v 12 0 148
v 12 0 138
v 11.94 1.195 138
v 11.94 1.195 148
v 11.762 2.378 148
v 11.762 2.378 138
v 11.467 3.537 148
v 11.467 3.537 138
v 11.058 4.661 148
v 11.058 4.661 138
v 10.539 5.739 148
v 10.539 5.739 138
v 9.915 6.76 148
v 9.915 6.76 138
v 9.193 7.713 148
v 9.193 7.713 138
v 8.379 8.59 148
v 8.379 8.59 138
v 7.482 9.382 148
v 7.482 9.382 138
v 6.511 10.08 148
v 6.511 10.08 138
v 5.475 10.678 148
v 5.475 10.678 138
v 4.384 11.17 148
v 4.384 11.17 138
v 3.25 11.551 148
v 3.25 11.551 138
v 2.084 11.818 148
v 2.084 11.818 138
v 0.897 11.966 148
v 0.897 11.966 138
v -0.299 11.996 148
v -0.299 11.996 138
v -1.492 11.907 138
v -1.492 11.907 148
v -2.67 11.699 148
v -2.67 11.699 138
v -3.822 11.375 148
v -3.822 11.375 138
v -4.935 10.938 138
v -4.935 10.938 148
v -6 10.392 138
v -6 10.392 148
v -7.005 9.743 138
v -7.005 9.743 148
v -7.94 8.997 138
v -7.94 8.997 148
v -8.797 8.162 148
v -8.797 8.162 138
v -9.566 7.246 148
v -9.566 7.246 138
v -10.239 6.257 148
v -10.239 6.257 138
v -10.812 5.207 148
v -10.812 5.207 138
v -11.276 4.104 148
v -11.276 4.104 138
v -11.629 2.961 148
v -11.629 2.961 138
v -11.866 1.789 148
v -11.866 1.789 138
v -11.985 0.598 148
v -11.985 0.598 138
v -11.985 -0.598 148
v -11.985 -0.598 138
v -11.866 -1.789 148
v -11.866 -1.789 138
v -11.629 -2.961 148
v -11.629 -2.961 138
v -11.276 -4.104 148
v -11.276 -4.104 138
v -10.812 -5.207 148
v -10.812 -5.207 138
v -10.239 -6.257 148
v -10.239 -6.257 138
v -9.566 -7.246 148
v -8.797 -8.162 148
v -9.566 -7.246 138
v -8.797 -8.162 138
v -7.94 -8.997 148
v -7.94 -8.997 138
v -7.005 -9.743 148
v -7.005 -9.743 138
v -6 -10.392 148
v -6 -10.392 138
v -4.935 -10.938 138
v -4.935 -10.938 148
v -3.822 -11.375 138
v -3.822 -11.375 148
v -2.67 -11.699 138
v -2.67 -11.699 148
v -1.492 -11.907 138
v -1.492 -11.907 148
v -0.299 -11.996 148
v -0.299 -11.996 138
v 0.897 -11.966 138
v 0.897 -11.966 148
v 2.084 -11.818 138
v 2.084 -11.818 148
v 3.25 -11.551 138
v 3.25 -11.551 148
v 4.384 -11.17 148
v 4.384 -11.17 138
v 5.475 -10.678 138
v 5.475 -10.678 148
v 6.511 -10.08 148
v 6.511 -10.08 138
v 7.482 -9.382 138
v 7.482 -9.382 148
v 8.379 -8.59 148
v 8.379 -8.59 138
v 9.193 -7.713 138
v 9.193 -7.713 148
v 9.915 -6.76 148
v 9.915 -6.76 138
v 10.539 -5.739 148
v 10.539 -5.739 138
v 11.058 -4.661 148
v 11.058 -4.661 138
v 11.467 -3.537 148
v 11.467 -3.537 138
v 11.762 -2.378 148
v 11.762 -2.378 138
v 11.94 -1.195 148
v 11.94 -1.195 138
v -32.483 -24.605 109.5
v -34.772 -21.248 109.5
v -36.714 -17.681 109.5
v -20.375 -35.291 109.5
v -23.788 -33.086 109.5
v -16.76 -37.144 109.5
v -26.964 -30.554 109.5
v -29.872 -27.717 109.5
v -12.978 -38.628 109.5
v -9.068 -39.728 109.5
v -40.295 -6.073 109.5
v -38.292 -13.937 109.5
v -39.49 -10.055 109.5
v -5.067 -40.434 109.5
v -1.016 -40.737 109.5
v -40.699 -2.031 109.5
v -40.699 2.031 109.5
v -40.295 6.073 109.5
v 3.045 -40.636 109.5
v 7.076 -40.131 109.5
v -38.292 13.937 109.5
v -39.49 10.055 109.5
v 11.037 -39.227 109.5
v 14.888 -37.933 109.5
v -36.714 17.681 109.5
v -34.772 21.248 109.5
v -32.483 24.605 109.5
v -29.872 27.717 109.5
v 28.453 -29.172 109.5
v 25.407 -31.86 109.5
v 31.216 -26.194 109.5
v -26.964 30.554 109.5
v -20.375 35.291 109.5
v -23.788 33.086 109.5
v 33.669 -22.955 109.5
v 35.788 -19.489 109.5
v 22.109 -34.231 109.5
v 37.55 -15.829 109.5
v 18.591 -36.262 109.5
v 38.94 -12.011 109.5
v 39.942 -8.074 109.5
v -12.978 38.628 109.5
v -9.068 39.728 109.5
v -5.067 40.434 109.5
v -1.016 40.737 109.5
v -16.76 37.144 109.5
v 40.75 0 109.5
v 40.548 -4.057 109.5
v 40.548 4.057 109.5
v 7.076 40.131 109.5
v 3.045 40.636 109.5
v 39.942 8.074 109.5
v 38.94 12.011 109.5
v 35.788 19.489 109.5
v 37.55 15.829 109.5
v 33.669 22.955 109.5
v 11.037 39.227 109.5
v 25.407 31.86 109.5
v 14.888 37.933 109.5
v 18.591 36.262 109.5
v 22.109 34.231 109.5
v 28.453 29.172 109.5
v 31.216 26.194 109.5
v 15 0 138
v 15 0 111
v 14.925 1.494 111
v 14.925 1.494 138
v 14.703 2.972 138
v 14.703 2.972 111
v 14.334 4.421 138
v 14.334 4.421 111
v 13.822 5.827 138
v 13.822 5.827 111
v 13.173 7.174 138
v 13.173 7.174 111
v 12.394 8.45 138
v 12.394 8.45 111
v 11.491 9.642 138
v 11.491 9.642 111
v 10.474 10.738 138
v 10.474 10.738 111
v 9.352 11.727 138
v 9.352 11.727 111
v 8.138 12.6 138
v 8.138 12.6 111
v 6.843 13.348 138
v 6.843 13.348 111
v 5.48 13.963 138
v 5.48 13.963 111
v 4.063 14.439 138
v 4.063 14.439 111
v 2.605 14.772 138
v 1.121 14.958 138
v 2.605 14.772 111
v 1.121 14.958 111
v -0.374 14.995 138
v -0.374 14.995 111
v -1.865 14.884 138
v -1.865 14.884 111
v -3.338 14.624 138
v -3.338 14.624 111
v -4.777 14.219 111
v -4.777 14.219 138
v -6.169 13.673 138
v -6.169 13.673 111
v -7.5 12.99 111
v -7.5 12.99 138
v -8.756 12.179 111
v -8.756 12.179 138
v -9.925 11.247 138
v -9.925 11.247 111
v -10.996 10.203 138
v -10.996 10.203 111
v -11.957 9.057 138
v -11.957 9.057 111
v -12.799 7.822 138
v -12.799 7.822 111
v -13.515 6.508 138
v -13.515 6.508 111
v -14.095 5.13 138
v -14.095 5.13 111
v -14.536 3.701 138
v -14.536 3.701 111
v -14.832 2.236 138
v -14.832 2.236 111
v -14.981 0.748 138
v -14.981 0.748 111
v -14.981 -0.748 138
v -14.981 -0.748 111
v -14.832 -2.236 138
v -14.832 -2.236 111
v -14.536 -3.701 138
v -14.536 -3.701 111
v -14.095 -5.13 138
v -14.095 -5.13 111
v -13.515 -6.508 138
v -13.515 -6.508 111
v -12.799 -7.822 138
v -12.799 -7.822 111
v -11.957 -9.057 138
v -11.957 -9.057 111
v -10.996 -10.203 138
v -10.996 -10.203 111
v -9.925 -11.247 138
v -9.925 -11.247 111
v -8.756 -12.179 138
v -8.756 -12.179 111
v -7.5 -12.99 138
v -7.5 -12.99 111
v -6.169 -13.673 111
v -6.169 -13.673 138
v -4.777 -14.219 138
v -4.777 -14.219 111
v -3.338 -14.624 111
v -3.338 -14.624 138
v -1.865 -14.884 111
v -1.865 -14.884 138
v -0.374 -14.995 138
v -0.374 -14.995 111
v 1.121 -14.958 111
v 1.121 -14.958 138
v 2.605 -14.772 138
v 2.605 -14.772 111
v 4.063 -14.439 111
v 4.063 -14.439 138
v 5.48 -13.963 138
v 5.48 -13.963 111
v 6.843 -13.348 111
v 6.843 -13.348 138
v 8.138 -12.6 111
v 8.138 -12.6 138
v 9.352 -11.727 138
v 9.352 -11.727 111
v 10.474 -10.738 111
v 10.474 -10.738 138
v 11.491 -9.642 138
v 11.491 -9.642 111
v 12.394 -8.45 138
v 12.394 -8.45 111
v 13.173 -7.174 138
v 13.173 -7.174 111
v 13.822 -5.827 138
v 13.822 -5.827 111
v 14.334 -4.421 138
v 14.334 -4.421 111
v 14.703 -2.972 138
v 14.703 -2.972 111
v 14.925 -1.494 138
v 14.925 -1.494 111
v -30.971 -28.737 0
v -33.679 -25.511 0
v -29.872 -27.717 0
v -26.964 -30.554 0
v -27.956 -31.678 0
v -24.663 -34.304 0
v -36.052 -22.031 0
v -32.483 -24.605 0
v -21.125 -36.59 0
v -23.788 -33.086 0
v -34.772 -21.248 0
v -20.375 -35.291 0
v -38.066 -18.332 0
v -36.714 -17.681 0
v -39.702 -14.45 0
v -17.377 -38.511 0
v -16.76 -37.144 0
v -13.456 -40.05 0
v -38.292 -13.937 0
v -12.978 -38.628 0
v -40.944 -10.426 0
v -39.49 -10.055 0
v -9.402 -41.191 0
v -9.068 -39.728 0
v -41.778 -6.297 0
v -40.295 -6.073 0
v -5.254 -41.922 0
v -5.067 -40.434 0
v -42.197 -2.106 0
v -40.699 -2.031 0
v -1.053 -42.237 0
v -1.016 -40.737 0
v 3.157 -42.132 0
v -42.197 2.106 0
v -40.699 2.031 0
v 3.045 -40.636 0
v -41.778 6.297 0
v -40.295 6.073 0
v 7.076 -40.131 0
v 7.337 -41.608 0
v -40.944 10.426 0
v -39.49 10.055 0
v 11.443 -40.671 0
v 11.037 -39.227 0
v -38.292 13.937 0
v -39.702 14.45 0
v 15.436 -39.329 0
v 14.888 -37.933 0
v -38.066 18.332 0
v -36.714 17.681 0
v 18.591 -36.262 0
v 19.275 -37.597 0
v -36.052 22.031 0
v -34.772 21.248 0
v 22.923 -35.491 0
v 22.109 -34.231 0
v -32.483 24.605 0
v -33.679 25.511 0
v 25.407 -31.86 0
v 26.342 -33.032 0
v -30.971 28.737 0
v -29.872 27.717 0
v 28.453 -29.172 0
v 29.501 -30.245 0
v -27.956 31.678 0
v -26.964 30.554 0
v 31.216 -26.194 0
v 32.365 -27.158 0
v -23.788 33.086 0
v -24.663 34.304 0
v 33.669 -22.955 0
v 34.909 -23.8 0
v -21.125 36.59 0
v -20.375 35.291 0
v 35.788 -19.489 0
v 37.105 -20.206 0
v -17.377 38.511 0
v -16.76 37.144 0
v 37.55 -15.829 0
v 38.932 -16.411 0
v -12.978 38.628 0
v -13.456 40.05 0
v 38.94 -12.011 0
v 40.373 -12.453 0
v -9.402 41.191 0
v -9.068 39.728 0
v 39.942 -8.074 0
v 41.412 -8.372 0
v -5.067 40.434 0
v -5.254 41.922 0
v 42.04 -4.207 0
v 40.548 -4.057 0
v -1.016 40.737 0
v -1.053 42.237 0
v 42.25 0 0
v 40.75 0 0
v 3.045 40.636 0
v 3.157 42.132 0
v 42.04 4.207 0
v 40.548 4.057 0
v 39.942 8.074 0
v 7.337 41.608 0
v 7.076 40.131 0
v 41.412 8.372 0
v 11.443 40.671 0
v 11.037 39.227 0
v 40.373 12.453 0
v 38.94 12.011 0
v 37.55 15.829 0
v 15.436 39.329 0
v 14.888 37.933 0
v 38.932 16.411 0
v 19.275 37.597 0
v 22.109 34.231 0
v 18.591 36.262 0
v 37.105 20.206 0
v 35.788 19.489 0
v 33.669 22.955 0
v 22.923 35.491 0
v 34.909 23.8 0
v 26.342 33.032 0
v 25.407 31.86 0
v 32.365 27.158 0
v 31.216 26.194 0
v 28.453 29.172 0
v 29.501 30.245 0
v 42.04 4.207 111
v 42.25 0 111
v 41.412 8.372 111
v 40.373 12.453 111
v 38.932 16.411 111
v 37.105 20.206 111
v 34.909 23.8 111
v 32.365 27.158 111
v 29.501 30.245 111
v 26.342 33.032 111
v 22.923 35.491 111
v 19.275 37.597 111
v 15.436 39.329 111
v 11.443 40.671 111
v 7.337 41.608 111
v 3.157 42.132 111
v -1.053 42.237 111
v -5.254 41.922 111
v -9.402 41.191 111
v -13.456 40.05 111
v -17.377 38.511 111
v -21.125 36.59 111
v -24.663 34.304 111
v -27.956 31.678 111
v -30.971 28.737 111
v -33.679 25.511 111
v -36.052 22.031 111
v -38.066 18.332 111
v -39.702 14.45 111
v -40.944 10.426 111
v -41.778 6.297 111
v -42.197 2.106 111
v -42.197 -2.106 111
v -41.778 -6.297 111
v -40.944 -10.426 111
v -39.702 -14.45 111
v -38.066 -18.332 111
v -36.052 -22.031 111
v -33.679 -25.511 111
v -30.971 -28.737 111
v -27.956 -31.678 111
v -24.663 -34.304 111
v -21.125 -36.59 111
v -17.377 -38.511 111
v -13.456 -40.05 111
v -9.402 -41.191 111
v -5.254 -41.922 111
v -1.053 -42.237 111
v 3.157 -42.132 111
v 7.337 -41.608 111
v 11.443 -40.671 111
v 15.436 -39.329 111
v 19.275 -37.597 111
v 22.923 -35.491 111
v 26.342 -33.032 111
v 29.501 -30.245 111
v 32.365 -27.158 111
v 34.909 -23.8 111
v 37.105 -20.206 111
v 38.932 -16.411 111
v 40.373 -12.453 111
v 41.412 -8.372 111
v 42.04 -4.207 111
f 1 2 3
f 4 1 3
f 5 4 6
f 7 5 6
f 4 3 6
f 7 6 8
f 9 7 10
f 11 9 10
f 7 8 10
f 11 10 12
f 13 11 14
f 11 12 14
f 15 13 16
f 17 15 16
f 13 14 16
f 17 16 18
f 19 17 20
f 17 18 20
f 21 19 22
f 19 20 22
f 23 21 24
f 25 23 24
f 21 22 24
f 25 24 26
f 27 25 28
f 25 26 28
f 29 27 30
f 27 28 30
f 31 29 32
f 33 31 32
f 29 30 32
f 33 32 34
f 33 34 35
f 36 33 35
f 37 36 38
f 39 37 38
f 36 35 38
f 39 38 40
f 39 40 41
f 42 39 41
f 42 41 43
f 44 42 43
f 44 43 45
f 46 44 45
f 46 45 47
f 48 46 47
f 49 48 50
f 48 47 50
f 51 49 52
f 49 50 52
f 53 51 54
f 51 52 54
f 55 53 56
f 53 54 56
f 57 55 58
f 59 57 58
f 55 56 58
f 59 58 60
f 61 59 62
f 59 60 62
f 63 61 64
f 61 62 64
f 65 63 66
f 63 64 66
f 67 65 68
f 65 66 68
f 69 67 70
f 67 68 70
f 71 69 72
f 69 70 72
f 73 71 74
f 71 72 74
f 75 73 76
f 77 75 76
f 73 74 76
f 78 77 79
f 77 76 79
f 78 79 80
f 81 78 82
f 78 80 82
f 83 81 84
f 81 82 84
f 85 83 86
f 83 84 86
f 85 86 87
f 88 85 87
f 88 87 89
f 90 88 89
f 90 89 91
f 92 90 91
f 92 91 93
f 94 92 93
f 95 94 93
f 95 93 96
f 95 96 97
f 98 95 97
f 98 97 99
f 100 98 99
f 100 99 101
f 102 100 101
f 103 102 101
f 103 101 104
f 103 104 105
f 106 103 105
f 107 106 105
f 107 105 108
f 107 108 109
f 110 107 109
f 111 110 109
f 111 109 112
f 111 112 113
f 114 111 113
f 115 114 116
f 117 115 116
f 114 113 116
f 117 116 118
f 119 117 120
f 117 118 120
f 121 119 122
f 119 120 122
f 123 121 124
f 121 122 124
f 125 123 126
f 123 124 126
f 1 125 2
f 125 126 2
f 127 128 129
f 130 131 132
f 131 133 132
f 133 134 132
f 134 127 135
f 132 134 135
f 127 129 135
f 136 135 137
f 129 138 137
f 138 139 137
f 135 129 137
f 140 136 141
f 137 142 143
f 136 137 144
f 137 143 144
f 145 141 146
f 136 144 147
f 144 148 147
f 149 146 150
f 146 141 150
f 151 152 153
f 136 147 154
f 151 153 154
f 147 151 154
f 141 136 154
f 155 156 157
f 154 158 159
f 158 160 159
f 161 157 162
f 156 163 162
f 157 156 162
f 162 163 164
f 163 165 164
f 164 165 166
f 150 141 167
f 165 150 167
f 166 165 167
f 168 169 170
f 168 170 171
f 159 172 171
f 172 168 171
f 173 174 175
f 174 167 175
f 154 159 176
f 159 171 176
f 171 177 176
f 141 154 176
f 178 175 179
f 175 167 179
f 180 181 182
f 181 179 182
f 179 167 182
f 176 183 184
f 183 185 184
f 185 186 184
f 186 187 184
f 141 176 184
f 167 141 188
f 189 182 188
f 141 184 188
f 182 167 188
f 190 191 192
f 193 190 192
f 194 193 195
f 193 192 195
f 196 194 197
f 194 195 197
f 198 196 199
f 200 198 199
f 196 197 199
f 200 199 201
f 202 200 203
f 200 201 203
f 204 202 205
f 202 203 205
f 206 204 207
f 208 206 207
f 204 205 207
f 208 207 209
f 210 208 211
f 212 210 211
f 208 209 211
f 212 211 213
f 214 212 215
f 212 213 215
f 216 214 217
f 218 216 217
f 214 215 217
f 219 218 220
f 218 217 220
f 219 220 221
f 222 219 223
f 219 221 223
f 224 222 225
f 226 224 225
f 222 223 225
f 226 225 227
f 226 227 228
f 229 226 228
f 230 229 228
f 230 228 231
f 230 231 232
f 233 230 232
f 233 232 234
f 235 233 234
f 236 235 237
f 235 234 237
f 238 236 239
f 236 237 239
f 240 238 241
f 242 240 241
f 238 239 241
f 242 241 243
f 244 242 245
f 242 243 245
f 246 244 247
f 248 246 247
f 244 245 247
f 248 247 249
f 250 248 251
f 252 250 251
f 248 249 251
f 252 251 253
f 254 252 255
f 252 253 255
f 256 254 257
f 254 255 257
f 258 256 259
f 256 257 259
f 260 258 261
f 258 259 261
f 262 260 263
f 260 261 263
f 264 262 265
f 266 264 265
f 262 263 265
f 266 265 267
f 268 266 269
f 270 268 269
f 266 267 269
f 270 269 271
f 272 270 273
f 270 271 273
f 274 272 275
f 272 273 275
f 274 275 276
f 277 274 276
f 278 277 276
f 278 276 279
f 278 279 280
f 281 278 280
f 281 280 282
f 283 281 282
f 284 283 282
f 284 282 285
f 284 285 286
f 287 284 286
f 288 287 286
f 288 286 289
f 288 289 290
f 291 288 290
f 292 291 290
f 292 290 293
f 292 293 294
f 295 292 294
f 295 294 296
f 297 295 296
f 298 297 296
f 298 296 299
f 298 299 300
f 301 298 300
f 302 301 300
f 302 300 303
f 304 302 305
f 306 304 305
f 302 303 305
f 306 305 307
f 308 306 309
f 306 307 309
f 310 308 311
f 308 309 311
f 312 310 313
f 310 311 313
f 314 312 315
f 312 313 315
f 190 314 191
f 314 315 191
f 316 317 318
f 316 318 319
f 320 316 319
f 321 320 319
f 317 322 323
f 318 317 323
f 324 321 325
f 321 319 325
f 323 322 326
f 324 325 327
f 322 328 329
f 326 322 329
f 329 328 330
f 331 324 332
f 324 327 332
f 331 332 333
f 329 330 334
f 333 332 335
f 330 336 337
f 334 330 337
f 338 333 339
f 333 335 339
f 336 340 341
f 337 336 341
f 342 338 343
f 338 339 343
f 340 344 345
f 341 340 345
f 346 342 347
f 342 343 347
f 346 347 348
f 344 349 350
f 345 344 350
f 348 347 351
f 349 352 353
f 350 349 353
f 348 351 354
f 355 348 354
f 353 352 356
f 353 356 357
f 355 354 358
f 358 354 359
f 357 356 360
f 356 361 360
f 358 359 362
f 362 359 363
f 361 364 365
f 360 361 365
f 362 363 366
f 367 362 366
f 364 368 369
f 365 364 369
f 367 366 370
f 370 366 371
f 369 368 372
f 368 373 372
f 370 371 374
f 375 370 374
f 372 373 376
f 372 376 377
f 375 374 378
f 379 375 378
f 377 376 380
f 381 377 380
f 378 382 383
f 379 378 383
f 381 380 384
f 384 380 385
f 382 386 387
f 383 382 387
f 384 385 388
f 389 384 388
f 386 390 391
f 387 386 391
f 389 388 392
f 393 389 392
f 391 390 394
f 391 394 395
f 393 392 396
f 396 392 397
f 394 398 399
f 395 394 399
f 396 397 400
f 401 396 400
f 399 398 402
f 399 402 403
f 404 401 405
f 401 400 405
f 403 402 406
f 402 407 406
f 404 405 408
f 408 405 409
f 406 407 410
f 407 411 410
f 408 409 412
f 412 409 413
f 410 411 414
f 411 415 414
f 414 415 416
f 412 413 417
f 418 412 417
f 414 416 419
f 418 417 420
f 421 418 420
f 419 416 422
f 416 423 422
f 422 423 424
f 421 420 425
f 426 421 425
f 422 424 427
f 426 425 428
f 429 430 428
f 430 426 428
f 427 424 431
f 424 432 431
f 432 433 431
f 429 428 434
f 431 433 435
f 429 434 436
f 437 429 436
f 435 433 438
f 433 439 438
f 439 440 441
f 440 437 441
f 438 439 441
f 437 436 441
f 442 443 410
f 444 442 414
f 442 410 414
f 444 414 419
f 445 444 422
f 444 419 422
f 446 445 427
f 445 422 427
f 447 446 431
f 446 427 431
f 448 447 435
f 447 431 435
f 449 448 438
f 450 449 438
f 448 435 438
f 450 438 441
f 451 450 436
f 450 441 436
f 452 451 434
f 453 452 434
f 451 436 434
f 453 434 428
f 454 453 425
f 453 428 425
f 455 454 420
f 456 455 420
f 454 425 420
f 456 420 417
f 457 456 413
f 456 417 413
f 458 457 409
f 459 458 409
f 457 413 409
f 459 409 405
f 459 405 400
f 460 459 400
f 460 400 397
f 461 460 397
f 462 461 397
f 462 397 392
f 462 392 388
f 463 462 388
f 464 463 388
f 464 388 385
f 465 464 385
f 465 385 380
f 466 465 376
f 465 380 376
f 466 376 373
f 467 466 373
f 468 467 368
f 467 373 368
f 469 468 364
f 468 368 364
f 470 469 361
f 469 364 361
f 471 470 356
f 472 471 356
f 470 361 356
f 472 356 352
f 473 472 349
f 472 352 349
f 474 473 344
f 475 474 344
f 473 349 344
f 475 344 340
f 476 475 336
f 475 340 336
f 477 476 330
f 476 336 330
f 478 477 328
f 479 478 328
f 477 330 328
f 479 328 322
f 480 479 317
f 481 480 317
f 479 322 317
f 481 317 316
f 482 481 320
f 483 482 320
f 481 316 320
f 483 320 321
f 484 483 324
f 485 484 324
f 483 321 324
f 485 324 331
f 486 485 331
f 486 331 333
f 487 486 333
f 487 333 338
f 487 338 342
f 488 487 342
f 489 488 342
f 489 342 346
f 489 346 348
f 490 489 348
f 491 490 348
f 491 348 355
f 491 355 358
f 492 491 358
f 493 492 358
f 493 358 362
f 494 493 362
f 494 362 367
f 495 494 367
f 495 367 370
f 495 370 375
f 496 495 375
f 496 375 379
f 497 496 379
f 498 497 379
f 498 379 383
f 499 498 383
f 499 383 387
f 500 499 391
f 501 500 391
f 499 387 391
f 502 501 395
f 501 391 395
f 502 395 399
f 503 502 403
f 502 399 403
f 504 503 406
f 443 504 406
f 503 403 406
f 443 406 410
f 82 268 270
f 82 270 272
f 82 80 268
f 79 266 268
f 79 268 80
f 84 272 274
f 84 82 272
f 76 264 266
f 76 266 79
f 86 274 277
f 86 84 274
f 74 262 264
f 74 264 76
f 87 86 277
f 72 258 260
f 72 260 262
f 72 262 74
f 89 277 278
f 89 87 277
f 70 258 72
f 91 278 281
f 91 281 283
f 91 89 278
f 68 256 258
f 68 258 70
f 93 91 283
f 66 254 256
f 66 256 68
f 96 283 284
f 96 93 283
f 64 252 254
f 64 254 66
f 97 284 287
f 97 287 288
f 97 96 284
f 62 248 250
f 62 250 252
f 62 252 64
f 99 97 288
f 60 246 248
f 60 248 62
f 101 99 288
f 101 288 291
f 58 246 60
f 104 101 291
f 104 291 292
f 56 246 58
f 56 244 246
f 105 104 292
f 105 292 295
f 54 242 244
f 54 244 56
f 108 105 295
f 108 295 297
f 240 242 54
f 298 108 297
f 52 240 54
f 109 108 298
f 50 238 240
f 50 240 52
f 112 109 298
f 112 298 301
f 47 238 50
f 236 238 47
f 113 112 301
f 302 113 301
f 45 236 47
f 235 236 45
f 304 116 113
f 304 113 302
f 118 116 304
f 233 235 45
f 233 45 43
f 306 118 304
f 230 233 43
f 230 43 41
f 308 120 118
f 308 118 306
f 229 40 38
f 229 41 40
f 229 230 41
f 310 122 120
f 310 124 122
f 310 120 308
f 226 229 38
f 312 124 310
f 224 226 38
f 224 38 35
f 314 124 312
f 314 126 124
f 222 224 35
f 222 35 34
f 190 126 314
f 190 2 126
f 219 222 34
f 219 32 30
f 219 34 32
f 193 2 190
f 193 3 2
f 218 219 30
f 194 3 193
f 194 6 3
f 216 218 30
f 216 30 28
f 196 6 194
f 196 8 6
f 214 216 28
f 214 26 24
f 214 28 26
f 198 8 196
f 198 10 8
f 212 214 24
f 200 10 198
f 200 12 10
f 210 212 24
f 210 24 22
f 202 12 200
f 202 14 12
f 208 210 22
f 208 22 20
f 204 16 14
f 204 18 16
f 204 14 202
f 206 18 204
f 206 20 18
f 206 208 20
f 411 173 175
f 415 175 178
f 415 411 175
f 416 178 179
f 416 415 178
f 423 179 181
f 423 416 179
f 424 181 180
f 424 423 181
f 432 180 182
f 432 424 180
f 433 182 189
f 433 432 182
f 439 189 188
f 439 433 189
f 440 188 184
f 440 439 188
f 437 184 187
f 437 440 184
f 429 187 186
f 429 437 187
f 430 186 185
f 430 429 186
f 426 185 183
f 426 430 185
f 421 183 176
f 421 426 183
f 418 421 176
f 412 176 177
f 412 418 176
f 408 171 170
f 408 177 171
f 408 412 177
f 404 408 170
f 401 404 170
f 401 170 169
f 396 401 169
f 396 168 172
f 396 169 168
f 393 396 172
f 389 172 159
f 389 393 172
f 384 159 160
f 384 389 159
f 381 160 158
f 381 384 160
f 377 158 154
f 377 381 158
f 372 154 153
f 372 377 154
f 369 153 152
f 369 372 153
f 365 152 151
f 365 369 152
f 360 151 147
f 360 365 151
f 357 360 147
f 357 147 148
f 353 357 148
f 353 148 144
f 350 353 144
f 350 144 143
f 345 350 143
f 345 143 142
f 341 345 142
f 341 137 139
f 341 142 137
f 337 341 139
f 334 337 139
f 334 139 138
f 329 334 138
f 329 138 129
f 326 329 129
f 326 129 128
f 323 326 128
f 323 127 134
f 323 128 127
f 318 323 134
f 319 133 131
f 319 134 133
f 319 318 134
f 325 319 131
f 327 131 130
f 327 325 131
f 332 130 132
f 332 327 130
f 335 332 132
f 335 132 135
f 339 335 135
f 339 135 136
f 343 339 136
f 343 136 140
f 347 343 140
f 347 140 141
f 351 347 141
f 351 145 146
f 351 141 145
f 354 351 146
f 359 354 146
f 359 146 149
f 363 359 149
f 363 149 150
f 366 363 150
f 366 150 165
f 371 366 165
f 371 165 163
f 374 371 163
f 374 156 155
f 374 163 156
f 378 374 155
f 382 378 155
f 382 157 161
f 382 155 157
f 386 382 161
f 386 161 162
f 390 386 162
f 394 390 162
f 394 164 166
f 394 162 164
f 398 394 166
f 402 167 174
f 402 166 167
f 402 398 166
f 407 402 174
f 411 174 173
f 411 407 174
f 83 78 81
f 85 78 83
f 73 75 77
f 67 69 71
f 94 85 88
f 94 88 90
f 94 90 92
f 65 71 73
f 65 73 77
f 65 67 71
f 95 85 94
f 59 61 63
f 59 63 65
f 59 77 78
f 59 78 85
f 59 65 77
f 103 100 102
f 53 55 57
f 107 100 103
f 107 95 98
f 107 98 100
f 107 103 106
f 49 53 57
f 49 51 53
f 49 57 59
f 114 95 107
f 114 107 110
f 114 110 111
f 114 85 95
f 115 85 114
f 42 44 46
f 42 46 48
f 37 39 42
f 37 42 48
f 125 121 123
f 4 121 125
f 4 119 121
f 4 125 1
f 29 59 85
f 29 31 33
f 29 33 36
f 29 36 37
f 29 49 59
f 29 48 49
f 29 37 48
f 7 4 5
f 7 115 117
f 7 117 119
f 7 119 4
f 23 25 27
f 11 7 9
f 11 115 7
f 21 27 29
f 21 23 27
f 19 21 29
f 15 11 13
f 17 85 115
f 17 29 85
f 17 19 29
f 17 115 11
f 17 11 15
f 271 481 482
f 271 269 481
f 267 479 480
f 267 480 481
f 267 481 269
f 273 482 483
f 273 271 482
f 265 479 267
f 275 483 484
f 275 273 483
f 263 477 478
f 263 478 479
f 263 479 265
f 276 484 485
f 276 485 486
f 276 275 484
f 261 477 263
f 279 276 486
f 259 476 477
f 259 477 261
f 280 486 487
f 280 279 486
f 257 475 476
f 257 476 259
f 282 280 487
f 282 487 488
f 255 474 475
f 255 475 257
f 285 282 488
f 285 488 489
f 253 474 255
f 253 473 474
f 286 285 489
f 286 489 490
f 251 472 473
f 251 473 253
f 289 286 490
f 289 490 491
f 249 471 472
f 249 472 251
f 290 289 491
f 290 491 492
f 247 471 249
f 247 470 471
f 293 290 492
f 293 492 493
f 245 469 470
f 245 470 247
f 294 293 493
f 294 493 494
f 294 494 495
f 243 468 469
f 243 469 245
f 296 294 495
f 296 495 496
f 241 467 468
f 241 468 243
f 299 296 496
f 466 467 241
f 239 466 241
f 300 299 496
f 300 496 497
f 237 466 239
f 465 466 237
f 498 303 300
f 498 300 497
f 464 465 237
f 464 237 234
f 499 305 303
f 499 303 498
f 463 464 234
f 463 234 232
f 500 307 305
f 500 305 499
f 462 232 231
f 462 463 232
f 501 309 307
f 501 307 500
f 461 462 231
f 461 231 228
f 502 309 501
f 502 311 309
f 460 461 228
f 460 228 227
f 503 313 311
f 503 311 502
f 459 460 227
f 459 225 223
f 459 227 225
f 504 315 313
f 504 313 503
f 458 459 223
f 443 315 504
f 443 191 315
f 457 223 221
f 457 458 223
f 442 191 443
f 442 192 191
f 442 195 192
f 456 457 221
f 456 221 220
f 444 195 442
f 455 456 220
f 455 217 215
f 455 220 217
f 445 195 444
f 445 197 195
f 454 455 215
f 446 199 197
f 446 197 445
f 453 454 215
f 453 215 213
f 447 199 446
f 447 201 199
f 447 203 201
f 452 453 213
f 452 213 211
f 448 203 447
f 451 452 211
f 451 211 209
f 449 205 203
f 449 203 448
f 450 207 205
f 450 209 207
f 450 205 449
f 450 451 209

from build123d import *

# Parameters (mm, degrees)
F0_R     = 42.25
F1_DEPTH = 111
F2_T     = -1.5
F3_R     = 15
F4_DEPTH = 27
F5_R     = 12
F6_DEPTH = 10


with BuildPart() as f1:
    # F0 (on Top) → F1 (new body)
    with BuildSketch(Plane.XY):
        Circle(F0_R)
    extrude(amount=F1_DEPTH)

    # F2
    f2_openings = [f1.faces().sort_by_distance(p)[0] for p in [
        (0, 0, 0),
    ]]
    offset(amount=F2_T, openings=f2_openings)

    # F3 (on face) → F4 (join)
    with BuildSketch(Plane.XY.offset(111)):
        Circle(F3_R)
    extrude(amount=F4_DEPTH)

    # F5 (on face) → F6 (join)
    with BuildSketch(Plane.XY.offset(138)):
        Circle(F5_R)
    extrude(amount=F6_DEPTH)


solid = f1.part
